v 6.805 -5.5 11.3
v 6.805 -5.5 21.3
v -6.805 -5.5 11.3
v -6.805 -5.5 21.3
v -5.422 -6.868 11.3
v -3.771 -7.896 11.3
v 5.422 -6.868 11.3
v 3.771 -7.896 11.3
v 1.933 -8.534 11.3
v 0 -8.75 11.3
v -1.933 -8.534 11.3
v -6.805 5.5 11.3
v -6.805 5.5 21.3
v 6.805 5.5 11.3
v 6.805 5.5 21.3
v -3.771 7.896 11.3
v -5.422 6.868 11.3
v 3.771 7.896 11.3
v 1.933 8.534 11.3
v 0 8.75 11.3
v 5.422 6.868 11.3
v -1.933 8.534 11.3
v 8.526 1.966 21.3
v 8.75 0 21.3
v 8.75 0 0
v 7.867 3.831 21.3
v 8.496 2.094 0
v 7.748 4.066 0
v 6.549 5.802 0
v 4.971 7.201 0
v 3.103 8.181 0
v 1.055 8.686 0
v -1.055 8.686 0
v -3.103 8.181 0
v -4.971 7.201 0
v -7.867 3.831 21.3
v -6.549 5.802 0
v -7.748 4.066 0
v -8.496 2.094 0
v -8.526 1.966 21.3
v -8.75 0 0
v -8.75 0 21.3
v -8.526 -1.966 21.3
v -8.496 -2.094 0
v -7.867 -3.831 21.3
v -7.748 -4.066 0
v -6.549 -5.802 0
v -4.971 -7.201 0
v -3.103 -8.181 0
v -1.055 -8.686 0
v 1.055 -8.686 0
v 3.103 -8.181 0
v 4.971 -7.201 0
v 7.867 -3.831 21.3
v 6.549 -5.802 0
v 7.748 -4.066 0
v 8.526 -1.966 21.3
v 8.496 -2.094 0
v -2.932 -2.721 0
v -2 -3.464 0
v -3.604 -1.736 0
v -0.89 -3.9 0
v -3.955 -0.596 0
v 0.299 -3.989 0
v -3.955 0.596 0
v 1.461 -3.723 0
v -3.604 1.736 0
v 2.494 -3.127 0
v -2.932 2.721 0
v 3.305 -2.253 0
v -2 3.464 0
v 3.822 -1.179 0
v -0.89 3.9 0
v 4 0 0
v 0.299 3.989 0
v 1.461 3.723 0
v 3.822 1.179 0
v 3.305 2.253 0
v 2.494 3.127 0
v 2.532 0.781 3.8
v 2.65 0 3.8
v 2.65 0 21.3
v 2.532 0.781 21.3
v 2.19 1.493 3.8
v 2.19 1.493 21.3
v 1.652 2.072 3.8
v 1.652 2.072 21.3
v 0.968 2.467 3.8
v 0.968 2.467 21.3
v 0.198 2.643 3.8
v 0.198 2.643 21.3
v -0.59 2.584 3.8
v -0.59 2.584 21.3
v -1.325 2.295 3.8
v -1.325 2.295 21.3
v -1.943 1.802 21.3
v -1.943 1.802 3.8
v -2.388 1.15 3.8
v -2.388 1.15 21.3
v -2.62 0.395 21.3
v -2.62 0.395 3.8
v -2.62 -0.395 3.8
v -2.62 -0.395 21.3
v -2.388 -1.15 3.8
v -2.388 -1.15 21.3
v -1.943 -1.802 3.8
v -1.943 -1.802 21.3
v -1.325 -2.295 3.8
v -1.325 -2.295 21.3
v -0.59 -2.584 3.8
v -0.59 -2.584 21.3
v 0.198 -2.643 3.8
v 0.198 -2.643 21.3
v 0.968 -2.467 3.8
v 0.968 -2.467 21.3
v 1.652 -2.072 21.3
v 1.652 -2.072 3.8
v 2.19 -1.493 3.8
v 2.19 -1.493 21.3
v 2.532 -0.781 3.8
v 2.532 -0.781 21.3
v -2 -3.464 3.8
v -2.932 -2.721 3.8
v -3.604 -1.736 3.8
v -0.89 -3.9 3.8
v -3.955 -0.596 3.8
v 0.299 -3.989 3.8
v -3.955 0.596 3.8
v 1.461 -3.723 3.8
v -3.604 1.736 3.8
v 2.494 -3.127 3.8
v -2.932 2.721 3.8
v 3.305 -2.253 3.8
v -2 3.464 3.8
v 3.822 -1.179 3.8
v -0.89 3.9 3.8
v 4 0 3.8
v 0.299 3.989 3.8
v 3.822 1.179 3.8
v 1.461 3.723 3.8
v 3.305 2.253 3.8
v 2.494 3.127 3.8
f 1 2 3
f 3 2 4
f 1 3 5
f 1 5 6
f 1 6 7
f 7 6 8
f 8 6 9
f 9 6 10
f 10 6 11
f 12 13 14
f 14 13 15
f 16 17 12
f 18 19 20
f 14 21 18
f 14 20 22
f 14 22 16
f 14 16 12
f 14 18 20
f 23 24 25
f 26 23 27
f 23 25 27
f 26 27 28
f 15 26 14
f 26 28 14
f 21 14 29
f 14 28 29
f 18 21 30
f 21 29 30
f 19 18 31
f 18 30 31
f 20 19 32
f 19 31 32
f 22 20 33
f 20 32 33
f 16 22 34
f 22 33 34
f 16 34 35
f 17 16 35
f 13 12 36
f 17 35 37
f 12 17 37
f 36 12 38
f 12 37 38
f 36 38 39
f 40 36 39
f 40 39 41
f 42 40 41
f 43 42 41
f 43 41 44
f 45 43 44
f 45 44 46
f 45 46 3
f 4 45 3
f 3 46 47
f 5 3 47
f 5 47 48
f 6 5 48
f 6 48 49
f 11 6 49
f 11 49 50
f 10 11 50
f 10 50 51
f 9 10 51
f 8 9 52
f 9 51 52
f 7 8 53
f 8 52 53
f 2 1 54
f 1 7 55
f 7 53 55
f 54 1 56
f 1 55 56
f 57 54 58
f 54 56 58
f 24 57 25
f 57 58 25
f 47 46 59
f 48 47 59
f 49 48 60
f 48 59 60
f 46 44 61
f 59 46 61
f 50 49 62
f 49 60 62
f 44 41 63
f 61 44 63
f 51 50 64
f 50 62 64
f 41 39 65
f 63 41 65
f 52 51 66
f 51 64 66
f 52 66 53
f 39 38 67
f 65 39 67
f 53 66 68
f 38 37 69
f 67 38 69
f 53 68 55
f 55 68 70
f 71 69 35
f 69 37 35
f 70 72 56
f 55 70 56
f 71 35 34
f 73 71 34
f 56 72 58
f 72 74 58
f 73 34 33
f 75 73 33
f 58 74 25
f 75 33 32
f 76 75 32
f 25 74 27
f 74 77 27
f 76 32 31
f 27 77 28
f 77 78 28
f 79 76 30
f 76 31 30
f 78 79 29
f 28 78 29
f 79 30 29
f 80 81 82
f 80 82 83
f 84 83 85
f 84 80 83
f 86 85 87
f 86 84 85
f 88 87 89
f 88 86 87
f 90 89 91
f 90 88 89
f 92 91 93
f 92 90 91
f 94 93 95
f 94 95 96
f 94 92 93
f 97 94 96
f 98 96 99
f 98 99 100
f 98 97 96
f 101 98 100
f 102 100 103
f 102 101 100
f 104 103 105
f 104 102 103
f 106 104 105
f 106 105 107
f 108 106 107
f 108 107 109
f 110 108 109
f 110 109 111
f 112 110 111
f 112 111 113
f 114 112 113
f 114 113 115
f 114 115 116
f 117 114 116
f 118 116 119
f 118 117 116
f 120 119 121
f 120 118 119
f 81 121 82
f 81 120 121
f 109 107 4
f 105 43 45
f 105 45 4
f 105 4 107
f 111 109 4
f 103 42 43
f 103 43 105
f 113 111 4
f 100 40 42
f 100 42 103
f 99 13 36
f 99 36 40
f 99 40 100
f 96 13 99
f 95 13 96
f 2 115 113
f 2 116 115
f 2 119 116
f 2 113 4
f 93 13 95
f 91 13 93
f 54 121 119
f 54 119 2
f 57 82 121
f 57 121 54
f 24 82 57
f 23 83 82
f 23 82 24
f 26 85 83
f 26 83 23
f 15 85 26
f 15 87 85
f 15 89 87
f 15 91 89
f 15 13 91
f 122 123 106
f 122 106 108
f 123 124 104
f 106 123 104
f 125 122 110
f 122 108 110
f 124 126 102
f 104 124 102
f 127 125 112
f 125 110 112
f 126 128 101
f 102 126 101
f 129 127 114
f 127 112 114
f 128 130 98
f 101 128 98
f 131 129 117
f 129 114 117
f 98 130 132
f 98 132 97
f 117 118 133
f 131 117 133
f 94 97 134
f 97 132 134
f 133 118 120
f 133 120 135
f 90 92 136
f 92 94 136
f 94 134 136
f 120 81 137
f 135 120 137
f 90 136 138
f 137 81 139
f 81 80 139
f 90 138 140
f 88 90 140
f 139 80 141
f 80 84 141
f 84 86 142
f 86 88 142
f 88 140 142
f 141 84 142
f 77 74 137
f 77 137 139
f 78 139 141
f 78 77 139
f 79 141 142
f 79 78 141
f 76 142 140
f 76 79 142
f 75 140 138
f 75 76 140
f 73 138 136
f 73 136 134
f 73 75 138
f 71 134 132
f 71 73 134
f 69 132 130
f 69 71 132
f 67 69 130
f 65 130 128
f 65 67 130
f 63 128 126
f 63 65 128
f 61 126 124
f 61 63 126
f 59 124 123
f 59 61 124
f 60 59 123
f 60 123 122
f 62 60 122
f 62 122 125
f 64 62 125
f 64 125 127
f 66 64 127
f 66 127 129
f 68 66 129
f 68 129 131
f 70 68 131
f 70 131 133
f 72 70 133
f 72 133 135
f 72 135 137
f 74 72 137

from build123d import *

# Parameters (mm, degrees)
F0_R     = 8.75
F0_R_2   = 4
F1_DEPTH = 21.3
F2_START = 3.8
F0_R_3   = 2.65
F2_DEPTH = 17.5
F4_DEPTH = 10


with BuildPart() as f1:
    # F0 (on Top) → F1 (new body)
    with BuildSketch(Plane.XY):
        Circle(F0_R)
        Circle(F0_R_2, mode=Mode.SUBTRACT)
    extrude(amount=F1_DEPTH)

    # F0 (on Top) → F2 (join)
    with BuildSketch(Plane.XY.offset(F2_START)):
        Circle(F0_R_2)
        Circle(F0_R_3, mode=Mode.SUBTRACT)
    extrude(amount=F2_DEPTH)

    # F3 (on face) → F4 (cut)
    with BuildSketch(Plane.XY.offset(21.3)):
        with BuildLine():
            ThreePointArc((-6.8053287944, -5.5), (0, -8.75), (6.8053287944, -5.5))
            Line((6.8053287944, -5.5), (-6.8053287944, -5.5))
        make_face()
        with BuildLine():
            Line((-6.8053287944, 5.5), (6.8053287944, 5.5))
            ThreePointArc((6.8053287944, 5.5), (0, 8.75), (-6.8053287944, 5.5))
        make_face()
    extrude(amount=-F4_DEPTH, mode=Mode.SUBTRACT)


solid = f1.part
